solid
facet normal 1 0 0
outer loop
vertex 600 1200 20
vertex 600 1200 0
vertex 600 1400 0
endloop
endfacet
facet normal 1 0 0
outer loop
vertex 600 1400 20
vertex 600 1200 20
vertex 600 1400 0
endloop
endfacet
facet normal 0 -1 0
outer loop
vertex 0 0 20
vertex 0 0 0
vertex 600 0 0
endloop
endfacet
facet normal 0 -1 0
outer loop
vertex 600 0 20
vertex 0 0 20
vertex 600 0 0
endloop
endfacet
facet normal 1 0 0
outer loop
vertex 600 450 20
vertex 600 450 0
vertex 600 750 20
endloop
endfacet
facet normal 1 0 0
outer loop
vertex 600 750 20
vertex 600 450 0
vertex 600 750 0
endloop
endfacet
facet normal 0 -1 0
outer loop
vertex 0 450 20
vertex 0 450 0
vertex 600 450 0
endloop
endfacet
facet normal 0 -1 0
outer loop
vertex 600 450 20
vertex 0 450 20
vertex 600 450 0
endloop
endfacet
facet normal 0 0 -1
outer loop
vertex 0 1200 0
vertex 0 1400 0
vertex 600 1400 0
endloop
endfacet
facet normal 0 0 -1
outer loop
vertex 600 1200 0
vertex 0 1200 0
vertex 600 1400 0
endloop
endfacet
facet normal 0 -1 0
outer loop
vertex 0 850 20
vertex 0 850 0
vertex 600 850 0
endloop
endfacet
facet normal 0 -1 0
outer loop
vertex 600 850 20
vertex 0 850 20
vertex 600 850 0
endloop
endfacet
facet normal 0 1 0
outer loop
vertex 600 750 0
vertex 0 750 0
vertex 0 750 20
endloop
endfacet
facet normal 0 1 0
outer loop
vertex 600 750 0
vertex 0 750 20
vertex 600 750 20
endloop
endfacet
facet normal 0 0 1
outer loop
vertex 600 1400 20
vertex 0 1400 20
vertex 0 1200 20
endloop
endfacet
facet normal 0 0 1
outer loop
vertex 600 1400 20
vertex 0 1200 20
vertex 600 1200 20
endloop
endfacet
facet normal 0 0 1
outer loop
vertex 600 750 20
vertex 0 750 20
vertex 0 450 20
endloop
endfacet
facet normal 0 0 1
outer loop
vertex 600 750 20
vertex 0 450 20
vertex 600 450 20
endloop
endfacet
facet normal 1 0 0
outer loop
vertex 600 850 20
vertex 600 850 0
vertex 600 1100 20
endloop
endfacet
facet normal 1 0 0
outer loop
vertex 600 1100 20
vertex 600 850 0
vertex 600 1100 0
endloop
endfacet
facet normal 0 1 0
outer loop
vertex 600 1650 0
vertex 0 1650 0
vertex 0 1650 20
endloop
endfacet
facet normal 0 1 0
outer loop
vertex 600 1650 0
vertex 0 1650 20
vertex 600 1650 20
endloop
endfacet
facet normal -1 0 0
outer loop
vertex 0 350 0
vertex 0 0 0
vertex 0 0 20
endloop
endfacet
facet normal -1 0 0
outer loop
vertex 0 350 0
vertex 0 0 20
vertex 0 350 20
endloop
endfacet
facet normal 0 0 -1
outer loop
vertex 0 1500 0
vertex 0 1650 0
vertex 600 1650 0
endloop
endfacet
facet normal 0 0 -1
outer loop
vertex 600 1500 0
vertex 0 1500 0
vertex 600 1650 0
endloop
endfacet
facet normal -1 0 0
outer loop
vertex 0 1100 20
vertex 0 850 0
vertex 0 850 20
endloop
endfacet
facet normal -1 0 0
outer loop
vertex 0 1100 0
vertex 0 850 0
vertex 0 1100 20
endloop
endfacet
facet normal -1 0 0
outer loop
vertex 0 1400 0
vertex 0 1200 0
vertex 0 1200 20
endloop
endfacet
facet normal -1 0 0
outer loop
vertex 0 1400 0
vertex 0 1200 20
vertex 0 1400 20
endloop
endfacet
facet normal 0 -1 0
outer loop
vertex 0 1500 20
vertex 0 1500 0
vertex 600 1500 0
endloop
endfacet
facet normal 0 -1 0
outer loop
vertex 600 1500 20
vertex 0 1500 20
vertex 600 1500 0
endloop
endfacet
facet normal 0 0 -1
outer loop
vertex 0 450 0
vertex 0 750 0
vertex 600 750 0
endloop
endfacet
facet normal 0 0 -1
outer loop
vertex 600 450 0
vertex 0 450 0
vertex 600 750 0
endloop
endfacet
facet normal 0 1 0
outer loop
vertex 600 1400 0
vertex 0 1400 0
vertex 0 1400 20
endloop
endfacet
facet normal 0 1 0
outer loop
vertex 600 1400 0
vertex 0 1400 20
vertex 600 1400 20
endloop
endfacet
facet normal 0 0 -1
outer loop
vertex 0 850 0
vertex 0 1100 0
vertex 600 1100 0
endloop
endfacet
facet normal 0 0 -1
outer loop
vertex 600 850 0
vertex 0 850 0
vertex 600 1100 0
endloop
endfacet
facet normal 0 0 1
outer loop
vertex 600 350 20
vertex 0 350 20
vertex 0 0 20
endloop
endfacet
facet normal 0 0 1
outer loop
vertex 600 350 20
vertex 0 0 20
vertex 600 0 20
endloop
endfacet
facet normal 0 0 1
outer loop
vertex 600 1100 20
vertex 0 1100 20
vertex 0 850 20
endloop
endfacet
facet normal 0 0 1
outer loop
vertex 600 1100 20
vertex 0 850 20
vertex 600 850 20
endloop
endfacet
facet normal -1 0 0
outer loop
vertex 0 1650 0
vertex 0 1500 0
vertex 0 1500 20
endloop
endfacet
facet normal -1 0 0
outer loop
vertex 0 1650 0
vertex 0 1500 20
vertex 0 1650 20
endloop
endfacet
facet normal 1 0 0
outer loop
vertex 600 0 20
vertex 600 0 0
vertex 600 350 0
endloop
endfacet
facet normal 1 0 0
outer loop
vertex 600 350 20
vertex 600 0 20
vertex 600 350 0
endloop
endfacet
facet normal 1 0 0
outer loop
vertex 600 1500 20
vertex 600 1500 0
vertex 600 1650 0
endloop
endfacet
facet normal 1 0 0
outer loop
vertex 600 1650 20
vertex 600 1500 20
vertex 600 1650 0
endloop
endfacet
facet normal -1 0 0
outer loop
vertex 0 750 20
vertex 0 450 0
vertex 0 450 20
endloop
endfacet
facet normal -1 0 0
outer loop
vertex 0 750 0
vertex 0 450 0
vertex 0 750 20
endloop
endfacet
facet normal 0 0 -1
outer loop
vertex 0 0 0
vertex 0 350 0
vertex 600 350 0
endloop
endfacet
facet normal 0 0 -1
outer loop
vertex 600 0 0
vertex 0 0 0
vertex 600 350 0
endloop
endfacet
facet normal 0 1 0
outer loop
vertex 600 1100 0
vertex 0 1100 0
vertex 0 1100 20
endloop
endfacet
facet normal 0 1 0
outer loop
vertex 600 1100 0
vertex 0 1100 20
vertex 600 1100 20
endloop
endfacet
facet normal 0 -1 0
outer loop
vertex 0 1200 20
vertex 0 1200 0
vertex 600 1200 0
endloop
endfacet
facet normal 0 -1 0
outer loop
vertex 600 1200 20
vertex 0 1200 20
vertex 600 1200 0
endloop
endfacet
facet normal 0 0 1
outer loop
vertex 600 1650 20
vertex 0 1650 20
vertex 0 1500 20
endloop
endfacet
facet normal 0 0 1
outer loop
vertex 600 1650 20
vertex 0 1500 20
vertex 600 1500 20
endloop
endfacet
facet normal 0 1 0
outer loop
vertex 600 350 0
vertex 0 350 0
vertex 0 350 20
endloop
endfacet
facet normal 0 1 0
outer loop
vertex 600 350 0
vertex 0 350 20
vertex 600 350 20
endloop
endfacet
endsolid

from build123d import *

# Parameters (mm, degrees)
F0_W     = 600
F0_H     = 350
F1_DEPTH = 20
F0_H_2   = 300
F2_DEPTH = 20
F0_H_3   = 250
F3_DEPTH = 20
F0_H_4   = 200
F4_DEPTH = 20
F0_H_5   = 150
F5_DEPTH = 20


with BuildPart() as f1:
    # F0 (on Top) → F1 (new body)
    with BuildSketch(Plane.XY):
        with Locations((300, 175)):
            Rectangle(F0_W, F0_H)
    extrude(amount=F1_DEPTH)


with BuildPart() as f2:
    # F0 (on Top) → F2 (new body)
    with BuildSketch(Plane.XY):
        with Locations((300, 600)):
            Rectangle(F0_W, F0_H_2)
    extrude(amount=F2_DEPTH)


with BuildPart() as f3:
    # F0 (on Top) → F3 (new body)
    with BuildSketch(Plane.XY):
        with Locations((300, 975)):
            Rectangle(F0_W, F0_H_3)
    extrude(amount=F3_DEPTH)


with BuildPart() as f4:
    # F0 (on Top) → F4 (new body)
    with BuildSketch(Plane.XY):
        with Locations((300, 1300)):
            Rectangle(F0_W, F0_H_4)
    extrude(amount=F4_DEPTH)


with BuildPart() as f5:
    # F0 (on Top) → F5 (new body)
    with BuildSketch(Plane.XY):
        with Locations((300, 1575)):
            Rectangle(F0_W, F0_H_5)
    extrude(amount=F5_DEPTH)


solid = Compound([f1.part, f2.part, f3.part, f4.part, f5.part])
